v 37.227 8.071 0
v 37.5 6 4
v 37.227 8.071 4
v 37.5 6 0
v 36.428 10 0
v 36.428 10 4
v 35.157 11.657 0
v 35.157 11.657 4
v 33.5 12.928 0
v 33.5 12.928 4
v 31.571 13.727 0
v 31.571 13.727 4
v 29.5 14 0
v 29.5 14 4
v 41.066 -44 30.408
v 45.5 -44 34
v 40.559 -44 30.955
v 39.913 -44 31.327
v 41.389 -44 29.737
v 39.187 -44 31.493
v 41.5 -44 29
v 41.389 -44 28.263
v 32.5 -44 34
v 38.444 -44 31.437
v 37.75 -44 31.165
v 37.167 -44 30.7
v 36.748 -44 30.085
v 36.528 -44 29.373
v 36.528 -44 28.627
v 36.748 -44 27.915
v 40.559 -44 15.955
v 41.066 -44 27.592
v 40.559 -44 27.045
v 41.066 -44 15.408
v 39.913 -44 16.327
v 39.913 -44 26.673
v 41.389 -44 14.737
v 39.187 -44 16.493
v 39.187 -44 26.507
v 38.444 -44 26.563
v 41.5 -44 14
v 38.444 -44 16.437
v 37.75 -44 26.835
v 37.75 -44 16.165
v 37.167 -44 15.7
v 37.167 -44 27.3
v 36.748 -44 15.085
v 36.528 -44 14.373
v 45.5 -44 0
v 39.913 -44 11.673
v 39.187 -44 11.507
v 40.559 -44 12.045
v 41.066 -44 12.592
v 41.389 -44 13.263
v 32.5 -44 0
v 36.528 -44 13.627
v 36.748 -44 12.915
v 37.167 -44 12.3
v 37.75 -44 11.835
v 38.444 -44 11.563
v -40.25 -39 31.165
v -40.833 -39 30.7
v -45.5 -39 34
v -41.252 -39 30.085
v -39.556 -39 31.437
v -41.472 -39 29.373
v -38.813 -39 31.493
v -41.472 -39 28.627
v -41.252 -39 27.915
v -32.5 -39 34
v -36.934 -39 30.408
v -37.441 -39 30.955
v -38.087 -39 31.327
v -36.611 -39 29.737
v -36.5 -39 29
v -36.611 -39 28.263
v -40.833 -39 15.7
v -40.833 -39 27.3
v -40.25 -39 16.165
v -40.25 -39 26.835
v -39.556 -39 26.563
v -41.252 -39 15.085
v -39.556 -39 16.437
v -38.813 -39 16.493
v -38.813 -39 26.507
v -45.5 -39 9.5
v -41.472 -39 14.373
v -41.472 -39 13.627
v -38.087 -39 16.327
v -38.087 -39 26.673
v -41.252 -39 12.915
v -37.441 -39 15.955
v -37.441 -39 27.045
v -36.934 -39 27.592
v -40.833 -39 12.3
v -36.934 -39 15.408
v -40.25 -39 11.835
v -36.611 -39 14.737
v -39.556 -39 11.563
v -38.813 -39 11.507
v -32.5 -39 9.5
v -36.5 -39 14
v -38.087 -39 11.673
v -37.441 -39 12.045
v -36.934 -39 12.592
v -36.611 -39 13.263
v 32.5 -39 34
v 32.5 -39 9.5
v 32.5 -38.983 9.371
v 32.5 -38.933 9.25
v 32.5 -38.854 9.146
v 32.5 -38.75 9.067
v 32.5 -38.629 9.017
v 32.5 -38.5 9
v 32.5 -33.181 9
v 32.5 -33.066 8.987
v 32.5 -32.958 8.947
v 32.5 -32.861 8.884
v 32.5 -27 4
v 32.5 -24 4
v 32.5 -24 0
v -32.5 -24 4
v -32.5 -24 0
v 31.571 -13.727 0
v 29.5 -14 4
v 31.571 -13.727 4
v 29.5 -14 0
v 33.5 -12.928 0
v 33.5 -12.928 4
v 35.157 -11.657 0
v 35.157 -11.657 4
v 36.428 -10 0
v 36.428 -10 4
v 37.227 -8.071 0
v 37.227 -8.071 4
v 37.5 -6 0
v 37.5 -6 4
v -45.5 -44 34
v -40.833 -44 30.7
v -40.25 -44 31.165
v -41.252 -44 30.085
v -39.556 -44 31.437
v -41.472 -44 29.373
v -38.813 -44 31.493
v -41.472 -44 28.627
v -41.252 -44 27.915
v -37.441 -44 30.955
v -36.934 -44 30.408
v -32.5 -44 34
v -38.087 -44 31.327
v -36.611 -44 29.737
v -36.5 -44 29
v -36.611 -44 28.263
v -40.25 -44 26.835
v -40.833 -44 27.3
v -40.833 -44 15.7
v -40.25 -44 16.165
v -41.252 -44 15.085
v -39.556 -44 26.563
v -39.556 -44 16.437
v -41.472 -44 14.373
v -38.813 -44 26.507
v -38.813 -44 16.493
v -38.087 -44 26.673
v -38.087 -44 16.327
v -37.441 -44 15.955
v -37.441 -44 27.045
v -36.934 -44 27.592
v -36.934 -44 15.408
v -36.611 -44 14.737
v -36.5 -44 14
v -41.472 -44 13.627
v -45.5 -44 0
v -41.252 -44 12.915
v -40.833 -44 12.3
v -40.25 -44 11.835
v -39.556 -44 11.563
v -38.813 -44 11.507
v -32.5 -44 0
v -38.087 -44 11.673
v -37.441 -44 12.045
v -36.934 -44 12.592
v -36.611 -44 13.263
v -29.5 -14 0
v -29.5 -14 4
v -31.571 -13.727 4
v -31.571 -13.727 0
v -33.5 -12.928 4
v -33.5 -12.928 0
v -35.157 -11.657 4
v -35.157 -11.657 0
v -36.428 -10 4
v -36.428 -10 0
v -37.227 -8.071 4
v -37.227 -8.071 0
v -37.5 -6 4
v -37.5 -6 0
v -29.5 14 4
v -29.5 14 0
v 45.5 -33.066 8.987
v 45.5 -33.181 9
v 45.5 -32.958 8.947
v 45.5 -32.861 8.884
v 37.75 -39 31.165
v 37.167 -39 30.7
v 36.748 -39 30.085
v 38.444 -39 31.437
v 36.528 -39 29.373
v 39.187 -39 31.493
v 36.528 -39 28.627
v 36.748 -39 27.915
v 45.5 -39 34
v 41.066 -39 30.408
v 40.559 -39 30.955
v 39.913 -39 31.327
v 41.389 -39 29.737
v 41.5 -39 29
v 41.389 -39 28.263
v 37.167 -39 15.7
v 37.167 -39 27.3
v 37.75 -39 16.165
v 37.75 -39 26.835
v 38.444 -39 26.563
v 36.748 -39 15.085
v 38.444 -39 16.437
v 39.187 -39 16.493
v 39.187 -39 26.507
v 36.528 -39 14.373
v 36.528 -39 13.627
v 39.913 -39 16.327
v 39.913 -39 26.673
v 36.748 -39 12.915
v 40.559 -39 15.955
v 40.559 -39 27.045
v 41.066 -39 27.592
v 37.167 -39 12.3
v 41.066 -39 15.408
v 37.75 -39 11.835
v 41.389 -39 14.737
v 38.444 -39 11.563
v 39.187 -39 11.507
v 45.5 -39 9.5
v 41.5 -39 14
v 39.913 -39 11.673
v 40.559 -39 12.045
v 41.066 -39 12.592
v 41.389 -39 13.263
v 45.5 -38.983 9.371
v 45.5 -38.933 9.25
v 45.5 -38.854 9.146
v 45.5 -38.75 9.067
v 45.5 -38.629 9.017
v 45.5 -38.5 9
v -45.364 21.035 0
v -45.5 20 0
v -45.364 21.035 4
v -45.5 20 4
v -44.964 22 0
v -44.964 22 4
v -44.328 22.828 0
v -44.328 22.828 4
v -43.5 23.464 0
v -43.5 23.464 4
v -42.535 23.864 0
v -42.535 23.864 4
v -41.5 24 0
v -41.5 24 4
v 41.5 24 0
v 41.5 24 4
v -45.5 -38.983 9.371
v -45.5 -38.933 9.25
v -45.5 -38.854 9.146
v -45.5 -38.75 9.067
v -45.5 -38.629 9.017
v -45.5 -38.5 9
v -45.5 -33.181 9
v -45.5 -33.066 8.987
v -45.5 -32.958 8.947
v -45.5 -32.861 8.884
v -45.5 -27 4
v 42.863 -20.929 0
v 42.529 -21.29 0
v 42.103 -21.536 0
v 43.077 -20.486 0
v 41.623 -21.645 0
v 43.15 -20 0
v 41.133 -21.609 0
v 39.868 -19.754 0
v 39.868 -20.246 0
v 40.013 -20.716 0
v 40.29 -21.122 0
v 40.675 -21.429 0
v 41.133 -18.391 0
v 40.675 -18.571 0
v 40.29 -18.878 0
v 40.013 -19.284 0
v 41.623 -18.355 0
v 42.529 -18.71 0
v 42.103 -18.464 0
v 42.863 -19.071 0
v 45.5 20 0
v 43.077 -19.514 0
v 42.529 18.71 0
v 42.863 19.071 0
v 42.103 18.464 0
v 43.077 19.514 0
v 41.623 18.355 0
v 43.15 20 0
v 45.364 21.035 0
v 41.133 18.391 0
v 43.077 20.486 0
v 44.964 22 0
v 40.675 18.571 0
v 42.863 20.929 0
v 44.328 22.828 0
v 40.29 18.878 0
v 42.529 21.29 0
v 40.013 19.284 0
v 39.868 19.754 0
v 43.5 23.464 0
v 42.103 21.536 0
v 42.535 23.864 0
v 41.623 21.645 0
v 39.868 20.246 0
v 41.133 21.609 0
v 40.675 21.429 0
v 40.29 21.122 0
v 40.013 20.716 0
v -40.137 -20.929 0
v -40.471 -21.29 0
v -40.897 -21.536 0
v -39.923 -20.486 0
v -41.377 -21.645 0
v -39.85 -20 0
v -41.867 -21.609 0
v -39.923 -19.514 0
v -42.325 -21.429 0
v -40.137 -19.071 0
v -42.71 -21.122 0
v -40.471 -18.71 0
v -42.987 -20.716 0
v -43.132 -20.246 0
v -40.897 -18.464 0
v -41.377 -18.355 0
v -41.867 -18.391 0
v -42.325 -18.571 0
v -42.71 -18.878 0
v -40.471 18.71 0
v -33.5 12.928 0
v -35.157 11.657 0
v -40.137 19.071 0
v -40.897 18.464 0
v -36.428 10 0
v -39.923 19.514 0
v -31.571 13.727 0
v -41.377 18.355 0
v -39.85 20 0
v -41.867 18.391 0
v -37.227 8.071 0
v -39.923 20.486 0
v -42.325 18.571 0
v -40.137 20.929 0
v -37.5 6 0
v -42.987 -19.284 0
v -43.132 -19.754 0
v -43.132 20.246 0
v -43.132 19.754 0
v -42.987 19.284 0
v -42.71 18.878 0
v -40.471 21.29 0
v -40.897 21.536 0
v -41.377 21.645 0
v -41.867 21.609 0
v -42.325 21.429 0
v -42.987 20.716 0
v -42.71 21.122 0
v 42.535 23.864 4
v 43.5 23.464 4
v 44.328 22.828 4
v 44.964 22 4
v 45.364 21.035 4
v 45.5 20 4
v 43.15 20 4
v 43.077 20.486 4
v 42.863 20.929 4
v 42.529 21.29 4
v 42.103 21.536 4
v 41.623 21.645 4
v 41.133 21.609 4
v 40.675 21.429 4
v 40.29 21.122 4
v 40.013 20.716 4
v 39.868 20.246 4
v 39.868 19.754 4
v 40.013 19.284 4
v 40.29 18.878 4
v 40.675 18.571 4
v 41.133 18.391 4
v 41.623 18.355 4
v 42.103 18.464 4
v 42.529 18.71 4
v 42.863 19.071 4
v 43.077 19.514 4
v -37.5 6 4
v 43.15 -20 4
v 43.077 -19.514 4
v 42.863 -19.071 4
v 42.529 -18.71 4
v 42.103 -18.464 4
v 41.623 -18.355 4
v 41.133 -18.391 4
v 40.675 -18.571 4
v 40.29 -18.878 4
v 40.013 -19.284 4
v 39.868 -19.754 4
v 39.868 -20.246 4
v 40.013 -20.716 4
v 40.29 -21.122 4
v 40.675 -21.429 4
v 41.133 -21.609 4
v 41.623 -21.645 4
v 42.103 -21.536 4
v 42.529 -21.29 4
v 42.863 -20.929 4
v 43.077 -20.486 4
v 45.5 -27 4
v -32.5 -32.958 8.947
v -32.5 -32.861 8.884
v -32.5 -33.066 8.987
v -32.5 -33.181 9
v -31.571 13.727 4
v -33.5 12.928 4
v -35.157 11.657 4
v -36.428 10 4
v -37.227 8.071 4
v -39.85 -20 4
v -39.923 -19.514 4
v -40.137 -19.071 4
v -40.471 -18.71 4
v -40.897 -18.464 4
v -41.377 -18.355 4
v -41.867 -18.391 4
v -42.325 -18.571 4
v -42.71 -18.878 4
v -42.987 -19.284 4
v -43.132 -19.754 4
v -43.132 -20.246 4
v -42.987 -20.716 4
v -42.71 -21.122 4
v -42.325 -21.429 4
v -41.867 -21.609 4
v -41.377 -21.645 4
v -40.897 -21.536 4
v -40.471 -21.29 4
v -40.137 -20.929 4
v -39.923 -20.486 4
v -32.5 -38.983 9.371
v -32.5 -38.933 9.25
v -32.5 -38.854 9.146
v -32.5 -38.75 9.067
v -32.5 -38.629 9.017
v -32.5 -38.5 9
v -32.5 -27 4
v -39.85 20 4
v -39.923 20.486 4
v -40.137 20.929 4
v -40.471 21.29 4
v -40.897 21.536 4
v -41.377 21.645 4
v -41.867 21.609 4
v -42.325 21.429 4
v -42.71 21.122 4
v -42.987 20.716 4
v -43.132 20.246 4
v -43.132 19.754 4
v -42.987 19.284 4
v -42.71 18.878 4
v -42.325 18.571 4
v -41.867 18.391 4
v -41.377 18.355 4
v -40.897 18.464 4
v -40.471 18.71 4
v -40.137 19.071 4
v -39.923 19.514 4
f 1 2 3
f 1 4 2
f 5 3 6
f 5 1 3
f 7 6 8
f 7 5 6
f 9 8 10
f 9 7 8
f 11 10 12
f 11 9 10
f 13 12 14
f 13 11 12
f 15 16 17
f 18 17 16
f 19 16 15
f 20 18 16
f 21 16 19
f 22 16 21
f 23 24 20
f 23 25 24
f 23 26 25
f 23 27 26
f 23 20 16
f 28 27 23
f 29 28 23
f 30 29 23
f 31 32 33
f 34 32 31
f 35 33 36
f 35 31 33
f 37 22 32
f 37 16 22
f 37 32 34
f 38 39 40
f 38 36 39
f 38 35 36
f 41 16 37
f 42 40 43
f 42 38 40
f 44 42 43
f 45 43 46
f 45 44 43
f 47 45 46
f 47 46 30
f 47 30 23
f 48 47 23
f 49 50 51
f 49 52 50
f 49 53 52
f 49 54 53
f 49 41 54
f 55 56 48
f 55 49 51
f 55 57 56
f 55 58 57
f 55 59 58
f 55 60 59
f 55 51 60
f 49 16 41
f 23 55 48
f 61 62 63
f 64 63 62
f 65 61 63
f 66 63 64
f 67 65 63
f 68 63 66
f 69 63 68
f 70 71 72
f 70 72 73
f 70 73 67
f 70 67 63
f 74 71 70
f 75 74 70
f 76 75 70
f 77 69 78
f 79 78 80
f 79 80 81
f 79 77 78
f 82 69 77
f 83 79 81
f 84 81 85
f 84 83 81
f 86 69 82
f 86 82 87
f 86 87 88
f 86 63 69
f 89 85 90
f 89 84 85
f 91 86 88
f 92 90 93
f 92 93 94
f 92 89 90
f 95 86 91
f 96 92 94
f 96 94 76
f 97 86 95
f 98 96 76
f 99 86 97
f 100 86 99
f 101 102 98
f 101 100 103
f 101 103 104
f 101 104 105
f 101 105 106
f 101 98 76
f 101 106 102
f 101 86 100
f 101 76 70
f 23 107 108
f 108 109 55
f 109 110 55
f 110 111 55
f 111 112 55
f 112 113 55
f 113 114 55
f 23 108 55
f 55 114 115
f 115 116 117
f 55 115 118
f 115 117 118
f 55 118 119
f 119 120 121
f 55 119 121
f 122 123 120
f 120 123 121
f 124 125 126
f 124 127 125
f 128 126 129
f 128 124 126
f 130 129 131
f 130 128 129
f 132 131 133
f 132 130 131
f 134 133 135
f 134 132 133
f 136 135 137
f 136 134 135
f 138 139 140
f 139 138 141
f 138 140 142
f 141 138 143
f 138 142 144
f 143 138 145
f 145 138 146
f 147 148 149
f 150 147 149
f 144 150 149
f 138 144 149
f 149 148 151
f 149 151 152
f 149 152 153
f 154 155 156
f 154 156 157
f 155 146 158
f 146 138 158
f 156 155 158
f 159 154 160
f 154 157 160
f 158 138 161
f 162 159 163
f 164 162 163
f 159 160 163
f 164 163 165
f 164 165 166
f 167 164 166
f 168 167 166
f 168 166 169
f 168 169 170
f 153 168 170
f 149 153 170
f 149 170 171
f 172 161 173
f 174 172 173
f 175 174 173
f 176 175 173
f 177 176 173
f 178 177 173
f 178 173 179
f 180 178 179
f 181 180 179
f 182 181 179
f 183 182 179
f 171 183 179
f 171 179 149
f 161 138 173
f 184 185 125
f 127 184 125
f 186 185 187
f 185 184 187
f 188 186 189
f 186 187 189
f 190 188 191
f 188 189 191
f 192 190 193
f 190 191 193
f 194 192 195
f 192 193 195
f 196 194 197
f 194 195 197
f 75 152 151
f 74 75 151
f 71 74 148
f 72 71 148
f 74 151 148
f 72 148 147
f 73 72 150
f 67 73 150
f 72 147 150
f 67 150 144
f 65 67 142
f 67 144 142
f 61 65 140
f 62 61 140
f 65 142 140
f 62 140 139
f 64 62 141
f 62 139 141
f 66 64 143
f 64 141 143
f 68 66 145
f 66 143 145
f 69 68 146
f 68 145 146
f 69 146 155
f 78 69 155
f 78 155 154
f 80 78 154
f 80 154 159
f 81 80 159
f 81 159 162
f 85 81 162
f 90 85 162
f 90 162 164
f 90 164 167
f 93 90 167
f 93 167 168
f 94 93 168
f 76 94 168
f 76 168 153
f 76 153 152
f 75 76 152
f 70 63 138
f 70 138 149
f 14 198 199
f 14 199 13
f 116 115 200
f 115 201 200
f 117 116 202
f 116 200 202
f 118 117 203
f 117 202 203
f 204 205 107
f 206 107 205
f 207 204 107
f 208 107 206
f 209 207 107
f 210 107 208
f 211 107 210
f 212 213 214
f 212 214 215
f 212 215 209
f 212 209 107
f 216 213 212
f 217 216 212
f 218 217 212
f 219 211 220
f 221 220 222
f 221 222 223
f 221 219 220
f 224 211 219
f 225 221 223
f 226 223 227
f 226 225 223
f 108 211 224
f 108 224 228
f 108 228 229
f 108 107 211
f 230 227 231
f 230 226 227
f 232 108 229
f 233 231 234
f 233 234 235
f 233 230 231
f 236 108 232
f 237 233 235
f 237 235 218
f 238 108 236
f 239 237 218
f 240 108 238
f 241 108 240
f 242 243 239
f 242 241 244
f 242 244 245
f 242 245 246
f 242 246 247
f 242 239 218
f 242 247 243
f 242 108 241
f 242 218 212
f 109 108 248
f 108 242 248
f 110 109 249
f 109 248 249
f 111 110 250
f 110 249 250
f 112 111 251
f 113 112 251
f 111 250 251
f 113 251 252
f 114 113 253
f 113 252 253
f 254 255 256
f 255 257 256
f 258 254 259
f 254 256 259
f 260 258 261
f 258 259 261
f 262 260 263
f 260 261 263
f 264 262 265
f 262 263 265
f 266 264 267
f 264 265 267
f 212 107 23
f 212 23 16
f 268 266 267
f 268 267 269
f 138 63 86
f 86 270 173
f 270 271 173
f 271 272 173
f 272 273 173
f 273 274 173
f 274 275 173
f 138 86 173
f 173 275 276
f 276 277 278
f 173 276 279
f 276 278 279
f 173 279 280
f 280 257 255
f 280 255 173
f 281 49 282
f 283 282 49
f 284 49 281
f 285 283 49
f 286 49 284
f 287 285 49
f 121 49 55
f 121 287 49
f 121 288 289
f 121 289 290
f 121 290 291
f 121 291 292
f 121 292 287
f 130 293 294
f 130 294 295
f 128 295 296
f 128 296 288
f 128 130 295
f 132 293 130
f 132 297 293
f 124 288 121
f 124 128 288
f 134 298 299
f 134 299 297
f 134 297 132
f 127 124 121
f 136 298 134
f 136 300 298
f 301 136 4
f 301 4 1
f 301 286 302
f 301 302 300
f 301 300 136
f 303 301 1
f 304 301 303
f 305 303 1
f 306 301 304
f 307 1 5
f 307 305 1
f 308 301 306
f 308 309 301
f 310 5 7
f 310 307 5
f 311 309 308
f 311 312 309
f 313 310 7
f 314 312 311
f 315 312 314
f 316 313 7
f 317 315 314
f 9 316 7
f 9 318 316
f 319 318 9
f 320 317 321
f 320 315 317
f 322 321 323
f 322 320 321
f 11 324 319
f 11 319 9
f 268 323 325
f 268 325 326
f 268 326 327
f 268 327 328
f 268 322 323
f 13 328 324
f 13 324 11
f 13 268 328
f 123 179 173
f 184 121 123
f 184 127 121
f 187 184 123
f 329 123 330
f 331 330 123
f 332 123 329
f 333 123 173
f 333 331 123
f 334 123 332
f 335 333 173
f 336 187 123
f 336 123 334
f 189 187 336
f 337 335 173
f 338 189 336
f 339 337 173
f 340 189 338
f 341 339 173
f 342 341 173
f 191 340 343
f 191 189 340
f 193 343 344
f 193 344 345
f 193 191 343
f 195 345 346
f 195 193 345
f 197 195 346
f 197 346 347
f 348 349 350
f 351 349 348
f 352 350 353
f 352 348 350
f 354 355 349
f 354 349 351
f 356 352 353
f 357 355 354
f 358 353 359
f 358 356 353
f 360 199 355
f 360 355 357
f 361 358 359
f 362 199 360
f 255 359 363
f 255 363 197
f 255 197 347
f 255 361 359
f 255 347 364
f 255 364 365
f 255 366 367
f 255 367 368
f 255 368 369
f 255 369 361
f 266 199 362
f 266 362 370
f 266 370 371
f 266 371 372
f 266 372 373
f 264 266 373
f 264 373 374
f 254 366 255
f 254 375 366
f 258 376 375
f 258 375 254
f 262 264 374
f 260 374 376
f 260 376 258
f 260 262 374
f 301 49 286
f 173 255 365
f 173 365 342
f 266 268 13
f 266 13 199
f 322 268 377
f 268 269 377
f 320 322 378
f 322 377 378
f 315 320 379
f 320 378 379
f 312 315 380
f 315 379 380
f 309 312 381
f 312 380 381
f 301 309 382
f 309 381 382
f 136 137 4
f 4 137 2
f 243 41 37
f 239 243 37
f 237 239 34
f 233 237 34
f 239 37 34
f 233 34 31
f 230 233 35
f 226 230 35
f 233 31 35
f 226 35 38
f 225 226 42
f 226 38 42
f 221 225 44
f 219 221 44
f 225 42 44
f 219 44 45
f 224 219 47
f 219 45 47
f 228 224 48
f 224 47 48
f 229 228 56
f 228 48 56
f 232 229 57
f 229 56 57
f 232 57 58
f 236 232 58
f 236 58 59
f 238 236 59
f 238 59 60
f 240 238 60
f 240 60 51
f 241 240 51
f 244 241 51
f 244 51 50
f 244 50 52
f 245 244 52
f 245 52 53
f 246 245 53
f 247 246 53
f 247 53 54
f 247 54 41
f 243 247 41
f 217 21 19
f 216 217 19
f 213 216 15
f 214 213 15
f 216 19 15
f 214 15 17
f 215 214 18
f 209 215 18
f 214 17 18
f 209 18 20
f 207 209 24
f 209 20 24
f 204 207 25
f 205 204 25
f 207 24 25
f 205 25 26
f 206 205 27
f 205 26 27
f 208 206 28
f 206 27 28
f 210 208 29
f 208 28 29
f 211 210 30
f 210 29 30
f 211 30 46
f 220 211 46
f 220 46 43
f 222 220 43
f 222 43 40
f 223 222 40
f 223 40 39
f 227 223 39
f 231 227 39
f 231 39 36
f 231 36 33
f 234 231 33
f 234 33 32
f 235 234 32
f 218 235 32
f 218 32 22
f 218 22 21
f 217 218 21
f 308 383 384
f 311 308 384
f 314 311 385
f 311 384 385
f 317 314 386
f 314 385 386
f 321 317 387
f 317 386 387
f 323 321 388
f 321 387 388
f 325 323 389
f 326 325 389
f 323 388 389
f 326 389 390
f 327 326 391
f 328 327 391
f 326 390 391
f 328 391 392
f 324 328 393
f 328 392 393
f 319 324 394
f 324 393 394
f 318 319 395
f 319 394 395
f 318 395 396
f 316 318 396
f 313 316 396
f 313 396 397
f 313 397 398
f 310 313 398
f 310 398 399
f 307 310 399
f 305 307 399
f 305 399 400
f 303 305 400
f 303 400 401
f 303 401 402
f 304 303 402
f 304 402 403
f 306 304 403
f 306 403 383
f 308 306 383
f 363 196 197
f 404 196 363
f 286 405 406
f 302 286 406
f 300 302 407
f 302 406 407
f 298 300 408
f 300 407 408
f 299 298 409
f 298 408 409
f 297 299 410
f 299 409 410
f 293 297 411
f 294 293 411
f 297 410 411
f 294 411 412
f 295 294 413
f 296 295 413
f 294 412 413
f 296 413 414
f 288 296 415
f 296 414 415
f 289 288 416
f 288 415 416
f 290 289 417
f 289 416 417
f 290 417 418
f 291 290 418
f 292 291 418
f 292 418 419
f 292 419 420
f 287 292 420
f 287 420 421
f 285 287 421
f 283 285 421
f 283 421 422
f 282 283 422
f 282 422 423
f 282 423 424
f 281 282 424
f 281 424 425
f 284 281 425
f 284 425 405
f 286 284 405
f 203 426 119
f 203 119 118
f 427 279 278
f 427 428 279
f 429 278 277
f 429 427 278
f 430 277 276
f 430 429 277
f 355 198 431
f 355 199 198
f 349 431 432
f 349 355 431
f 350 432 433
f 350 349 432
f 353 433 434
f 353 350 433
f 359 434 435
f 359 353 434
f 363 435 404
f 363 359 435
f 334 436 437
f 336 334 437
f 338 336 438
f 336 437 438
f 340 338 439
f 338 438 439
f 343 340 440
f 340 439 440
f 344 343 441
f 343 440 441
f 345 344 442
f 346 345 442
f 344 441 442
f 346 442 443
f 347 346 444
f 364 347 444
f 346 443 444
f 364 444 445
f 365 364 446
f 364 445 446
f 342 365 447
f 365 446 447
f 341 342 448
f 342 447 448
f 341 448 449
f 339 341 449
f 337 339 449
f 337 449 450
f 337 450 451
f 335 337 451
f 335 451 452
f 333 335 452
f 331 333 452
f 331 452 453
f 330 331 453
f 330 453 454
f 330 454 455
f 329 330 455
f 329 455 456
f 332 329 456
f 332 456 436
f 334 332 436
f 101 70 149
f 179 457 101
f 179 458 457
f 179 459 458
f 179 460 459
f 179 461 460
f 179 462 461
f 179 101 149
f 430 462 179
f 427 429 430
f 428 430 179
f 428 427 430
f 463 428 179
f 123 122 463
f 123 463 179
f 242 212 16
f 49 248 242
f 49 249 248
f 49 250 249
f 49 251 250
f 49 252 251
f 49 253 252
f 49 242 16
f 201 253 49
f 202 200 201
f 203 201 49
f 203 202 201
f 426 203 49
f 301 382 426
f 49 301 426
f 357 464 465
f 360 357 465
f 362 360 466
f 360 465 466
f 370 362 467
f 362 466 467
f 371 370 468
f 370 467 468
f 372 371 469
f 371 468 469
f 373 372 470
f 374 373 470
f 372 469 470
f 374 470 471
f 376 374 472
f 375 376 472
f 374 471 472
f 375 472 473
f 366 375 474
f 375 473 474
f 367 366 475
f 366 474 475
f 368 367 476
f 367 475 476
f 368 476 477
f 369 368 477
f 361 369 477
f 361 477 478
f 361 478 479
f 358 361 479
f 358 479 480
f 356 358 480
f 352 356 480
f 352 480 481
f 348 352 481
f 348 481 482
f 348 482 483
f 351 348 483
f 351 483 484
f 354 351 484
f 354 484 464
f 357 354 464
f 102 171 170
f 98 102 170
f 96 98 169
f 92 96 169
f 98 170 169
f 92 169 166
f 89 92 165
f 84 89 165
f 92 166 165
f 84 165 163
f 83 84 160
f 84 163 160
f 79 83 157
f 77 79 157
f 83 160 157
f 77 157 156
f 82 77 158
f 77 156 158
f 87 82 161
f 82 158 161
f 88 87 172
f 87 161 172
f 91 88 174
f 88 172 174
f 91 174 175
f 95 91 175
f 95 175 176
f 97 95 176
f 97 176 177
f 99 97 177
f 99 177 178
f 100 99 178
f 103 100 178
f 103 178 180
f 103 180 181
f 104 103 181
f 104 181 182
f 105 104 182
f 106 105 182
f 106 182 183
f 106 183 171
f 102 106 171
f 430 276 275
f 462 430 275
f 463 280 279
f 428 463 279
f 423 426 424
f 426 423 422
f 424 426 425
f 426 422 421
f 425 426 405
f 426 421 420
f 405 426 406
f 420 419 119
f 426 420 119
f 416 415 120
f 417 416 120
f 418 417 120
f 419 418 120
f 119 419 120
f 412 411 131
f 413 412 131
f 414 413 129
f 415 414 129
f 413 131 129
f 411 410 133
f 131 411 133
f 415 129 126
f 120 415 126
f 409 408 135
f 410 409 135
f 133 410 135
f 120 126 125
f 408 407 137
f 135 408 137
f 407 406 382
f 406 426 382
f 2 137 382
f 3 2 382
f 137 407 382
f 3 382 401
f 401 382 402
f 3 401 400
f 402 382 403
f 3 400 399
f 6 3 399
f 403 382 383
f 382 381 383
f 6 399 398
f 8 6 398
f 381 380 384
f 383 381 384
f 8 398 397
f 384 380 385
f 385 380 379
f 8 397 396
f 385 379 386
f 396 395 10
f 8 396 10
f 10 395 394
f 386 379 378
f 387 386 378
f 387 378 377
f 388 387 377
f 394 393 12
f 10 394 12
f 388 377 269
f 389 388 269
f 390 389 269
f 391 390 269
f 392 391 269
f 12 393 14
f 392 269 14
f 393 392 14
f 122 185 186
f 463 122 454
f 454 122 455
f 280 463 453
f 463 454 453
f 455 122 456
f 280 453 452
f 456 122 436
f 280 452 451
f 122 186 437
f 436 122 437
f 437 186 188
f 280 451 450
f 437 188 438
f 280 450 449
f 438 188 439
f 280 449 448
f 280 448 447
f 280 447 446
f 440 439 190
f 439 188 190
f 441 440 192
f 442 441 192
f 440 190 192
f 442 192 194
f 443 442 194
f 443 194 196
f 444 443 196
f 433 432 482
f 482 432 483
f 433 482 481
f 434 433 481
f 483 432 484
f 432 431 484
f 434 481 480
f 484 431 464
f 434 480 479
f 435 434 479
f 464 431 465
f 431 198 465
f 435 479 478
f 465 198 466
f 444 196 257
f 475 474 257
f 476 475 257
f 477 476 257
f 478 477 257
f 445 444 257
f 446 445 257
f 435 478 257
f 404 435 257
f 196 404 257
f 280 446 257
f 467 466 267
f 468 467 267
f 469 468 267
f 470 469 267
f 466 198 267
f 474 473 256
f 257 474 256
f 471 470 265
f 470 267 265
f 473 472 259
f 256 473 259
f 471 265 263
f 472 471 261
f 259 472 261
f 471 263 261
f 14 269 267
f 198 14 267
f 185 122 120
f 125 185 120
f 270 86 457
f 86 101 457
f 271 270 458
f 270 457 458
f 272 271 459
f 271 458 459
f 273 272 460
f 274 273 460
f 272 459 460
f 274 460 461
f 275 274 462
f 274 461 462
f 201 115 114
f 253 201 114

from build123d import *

# Parameters (mm, degrees)
SKETCH_1_W          = 91
SKETCH_1_H          = 48
EXTRUDE_1_DEPTH     = 4
SKETCH_2_W          = 75
SKETCH_2_H          = 28
CUT_EXTRUDE_1_DEPTH = 52.596996037
FILLET_2_R          = 8
SKETCH_3_R          = 1.65
CUT_EXTRUDE_2_DEPTH = 52.596996037
SKETCH_5_W          = 13
SKETCH_5_H          = 20
EXTRUDE_2_DEPTH     = 4
SKETCH_6_W          = 13
SKETCH_6_H          = 5
EXTRUDE_3_DEPTH     = 30
EXTRUDE_4_DEPTH     = 13
SKETCH_8_R          = 2.5
CUT_EXTRUDE_3_DEPTH = 30
CUT_EXTRUDE_4_DEPTH = 107.644268482
FILLET_3_R          = 0.5
FILLET_4_R          = 4


with BuildPart() as part:
    # 草图1 → 凸台-拉伸1 (new body)
    with BuildSketch(Plane.XY):
        Rectangle(SKETCH_1_W, SKETCH_1_H)
    extrude(amount=EXTRUDE_1_DEPTH)

    # 草图2 → 切除-拉伸1 (cut, through all)
    with BuildSketch(Plane.XY.offset(4)):
        Rectangle(SKETCH_2_W, SKETCH_2_H)
    extrude(amount=-CUT_EXTRUDE_1_DEPTH, mode=Mode.SUBTRACT)

    # 圆角2
    fillet_2_edges = [part.edges().sort_by_distance(p)[0] for p in [
        (37.5, 14, 2),
        (37.5, -14, 2),
        (-37.5, -14, 2),
        (-37.5, 14, 2),
    ]]
    fillet(fillet_2_edges, radius=FILLET_2_R)

    # 草图3 → 切除-拉伸2 (cut, through all)
    with BuildSketch(Plane.XY.offset(4)):
        with Locations((-41.5, 20)):
            Circle(SKETCH_3_R)
        with Locations((-41.5, -20)):
            Circle(SKETCH_3_R)
        with Locations((41.5, 20)):
            Circle(SKETCH_3_R)
        with Locations((41.5, -20)):
            Circle(SKETCH_3_R)
    extrude(amount=-CUT_EXTRUDE_2_DEPTH, mode=Mode.SUBTRACT)

    # 草图5 → 凸台-拉伸2 (add)
    with BuildSketch(Plane(origin=(0, 0, 0), x_dir=(-1, 0, 0), z_dir=(0, 0, -1))):
        with Locations((-39, -34)):
            Rectangle(SKETCH_5_W, SKETCH_5_H)
        with Locations((39, -34)):
            Rectangle(SKETCH_5_W, SKETCH_5_H)
    extrude(amount=-EXTRUDE_2_DEPTH)

    # 草图6 → 凸台-拉伸3 (add)
    with BuildSketch(Plane.XY.offset(4)):
        with Locations((-39, -41.5)):
            Rectangle(SKETCH_6_W, SKETCH_6_H)
        with Locations((39, -41.5)):
            Rectangle(SKETCH_6_W, SKETCH_6_H)
    extrude(amount=EXTRUDE_3_DEPTH)

    # 草图7 → 凸台-拉伸4 (add)
    with BuildSketch(Plane(origin=(45.5, 0, 0), x_dir=(0, 0, -1), z_dir=(1, 0, 0))):
        Polygon((-4, -27), (-14, -39), (-4, -39), align=None)
    extrude_4 = extrude(amount=-EXTRUDE_4_DEPTH)

    # 镜向2: 凸台-拉伸4 across plane
    add(extrude_4.mirror(Plane(origin=(0, 0, 0), x_dir=(0, 0, 1), z_dir=(1, 0, 0))))

    # 草图8 → 切除-拉伸3 (cut)
    with BuildSketch(Plane.XZ.offset(44)):
        with Locations((39, 29)):
            Circle(SKETCH_8_R)
        with Locations((-39, 29)):
            Circle(SKETCH_8_R)
        with Locations((39, 14)):
            Circle(SKETCH_8_R)
        with Locations((-39, 14)):
            Circle(SKETCH_8_R)
    extrude(amount=-CUT_EXTRUDE_3_DEPTH, mode=Mode.SUBTRACT)

    # 草图9 → 切除-拉伸4 (cut, through all)
    with BuildSketch(Plane.ZY.offset(45.5)):
        Polygon((9, -33), (9, -39), (14, -39), align=None)
    extrude(amount=-CUT_EXTRUDE_4_DEPTH, mode=Mode.SUBTRACT)

    # 圆角3
    fillet_3_edges = [part.edges().sort_by_distance(p)[0] for p in [
        (39, -39, 9),
        (39, -33, 9),
        (-39, -33, 9),
        (-39, -39, 9),
    ]]
    fillet(fillet_3_edges, radius=FILLET_3_R)

    # 圆角4
    fillet_4_edges = [part.edges().sort_by_distance(p)[0] for p in [
        (-45.5, 24, 2),
        (45.5, 24, 2),
    ]]
    fillet(fillet_4_edges, radius=FILLET_4_R)


solid = part.part
